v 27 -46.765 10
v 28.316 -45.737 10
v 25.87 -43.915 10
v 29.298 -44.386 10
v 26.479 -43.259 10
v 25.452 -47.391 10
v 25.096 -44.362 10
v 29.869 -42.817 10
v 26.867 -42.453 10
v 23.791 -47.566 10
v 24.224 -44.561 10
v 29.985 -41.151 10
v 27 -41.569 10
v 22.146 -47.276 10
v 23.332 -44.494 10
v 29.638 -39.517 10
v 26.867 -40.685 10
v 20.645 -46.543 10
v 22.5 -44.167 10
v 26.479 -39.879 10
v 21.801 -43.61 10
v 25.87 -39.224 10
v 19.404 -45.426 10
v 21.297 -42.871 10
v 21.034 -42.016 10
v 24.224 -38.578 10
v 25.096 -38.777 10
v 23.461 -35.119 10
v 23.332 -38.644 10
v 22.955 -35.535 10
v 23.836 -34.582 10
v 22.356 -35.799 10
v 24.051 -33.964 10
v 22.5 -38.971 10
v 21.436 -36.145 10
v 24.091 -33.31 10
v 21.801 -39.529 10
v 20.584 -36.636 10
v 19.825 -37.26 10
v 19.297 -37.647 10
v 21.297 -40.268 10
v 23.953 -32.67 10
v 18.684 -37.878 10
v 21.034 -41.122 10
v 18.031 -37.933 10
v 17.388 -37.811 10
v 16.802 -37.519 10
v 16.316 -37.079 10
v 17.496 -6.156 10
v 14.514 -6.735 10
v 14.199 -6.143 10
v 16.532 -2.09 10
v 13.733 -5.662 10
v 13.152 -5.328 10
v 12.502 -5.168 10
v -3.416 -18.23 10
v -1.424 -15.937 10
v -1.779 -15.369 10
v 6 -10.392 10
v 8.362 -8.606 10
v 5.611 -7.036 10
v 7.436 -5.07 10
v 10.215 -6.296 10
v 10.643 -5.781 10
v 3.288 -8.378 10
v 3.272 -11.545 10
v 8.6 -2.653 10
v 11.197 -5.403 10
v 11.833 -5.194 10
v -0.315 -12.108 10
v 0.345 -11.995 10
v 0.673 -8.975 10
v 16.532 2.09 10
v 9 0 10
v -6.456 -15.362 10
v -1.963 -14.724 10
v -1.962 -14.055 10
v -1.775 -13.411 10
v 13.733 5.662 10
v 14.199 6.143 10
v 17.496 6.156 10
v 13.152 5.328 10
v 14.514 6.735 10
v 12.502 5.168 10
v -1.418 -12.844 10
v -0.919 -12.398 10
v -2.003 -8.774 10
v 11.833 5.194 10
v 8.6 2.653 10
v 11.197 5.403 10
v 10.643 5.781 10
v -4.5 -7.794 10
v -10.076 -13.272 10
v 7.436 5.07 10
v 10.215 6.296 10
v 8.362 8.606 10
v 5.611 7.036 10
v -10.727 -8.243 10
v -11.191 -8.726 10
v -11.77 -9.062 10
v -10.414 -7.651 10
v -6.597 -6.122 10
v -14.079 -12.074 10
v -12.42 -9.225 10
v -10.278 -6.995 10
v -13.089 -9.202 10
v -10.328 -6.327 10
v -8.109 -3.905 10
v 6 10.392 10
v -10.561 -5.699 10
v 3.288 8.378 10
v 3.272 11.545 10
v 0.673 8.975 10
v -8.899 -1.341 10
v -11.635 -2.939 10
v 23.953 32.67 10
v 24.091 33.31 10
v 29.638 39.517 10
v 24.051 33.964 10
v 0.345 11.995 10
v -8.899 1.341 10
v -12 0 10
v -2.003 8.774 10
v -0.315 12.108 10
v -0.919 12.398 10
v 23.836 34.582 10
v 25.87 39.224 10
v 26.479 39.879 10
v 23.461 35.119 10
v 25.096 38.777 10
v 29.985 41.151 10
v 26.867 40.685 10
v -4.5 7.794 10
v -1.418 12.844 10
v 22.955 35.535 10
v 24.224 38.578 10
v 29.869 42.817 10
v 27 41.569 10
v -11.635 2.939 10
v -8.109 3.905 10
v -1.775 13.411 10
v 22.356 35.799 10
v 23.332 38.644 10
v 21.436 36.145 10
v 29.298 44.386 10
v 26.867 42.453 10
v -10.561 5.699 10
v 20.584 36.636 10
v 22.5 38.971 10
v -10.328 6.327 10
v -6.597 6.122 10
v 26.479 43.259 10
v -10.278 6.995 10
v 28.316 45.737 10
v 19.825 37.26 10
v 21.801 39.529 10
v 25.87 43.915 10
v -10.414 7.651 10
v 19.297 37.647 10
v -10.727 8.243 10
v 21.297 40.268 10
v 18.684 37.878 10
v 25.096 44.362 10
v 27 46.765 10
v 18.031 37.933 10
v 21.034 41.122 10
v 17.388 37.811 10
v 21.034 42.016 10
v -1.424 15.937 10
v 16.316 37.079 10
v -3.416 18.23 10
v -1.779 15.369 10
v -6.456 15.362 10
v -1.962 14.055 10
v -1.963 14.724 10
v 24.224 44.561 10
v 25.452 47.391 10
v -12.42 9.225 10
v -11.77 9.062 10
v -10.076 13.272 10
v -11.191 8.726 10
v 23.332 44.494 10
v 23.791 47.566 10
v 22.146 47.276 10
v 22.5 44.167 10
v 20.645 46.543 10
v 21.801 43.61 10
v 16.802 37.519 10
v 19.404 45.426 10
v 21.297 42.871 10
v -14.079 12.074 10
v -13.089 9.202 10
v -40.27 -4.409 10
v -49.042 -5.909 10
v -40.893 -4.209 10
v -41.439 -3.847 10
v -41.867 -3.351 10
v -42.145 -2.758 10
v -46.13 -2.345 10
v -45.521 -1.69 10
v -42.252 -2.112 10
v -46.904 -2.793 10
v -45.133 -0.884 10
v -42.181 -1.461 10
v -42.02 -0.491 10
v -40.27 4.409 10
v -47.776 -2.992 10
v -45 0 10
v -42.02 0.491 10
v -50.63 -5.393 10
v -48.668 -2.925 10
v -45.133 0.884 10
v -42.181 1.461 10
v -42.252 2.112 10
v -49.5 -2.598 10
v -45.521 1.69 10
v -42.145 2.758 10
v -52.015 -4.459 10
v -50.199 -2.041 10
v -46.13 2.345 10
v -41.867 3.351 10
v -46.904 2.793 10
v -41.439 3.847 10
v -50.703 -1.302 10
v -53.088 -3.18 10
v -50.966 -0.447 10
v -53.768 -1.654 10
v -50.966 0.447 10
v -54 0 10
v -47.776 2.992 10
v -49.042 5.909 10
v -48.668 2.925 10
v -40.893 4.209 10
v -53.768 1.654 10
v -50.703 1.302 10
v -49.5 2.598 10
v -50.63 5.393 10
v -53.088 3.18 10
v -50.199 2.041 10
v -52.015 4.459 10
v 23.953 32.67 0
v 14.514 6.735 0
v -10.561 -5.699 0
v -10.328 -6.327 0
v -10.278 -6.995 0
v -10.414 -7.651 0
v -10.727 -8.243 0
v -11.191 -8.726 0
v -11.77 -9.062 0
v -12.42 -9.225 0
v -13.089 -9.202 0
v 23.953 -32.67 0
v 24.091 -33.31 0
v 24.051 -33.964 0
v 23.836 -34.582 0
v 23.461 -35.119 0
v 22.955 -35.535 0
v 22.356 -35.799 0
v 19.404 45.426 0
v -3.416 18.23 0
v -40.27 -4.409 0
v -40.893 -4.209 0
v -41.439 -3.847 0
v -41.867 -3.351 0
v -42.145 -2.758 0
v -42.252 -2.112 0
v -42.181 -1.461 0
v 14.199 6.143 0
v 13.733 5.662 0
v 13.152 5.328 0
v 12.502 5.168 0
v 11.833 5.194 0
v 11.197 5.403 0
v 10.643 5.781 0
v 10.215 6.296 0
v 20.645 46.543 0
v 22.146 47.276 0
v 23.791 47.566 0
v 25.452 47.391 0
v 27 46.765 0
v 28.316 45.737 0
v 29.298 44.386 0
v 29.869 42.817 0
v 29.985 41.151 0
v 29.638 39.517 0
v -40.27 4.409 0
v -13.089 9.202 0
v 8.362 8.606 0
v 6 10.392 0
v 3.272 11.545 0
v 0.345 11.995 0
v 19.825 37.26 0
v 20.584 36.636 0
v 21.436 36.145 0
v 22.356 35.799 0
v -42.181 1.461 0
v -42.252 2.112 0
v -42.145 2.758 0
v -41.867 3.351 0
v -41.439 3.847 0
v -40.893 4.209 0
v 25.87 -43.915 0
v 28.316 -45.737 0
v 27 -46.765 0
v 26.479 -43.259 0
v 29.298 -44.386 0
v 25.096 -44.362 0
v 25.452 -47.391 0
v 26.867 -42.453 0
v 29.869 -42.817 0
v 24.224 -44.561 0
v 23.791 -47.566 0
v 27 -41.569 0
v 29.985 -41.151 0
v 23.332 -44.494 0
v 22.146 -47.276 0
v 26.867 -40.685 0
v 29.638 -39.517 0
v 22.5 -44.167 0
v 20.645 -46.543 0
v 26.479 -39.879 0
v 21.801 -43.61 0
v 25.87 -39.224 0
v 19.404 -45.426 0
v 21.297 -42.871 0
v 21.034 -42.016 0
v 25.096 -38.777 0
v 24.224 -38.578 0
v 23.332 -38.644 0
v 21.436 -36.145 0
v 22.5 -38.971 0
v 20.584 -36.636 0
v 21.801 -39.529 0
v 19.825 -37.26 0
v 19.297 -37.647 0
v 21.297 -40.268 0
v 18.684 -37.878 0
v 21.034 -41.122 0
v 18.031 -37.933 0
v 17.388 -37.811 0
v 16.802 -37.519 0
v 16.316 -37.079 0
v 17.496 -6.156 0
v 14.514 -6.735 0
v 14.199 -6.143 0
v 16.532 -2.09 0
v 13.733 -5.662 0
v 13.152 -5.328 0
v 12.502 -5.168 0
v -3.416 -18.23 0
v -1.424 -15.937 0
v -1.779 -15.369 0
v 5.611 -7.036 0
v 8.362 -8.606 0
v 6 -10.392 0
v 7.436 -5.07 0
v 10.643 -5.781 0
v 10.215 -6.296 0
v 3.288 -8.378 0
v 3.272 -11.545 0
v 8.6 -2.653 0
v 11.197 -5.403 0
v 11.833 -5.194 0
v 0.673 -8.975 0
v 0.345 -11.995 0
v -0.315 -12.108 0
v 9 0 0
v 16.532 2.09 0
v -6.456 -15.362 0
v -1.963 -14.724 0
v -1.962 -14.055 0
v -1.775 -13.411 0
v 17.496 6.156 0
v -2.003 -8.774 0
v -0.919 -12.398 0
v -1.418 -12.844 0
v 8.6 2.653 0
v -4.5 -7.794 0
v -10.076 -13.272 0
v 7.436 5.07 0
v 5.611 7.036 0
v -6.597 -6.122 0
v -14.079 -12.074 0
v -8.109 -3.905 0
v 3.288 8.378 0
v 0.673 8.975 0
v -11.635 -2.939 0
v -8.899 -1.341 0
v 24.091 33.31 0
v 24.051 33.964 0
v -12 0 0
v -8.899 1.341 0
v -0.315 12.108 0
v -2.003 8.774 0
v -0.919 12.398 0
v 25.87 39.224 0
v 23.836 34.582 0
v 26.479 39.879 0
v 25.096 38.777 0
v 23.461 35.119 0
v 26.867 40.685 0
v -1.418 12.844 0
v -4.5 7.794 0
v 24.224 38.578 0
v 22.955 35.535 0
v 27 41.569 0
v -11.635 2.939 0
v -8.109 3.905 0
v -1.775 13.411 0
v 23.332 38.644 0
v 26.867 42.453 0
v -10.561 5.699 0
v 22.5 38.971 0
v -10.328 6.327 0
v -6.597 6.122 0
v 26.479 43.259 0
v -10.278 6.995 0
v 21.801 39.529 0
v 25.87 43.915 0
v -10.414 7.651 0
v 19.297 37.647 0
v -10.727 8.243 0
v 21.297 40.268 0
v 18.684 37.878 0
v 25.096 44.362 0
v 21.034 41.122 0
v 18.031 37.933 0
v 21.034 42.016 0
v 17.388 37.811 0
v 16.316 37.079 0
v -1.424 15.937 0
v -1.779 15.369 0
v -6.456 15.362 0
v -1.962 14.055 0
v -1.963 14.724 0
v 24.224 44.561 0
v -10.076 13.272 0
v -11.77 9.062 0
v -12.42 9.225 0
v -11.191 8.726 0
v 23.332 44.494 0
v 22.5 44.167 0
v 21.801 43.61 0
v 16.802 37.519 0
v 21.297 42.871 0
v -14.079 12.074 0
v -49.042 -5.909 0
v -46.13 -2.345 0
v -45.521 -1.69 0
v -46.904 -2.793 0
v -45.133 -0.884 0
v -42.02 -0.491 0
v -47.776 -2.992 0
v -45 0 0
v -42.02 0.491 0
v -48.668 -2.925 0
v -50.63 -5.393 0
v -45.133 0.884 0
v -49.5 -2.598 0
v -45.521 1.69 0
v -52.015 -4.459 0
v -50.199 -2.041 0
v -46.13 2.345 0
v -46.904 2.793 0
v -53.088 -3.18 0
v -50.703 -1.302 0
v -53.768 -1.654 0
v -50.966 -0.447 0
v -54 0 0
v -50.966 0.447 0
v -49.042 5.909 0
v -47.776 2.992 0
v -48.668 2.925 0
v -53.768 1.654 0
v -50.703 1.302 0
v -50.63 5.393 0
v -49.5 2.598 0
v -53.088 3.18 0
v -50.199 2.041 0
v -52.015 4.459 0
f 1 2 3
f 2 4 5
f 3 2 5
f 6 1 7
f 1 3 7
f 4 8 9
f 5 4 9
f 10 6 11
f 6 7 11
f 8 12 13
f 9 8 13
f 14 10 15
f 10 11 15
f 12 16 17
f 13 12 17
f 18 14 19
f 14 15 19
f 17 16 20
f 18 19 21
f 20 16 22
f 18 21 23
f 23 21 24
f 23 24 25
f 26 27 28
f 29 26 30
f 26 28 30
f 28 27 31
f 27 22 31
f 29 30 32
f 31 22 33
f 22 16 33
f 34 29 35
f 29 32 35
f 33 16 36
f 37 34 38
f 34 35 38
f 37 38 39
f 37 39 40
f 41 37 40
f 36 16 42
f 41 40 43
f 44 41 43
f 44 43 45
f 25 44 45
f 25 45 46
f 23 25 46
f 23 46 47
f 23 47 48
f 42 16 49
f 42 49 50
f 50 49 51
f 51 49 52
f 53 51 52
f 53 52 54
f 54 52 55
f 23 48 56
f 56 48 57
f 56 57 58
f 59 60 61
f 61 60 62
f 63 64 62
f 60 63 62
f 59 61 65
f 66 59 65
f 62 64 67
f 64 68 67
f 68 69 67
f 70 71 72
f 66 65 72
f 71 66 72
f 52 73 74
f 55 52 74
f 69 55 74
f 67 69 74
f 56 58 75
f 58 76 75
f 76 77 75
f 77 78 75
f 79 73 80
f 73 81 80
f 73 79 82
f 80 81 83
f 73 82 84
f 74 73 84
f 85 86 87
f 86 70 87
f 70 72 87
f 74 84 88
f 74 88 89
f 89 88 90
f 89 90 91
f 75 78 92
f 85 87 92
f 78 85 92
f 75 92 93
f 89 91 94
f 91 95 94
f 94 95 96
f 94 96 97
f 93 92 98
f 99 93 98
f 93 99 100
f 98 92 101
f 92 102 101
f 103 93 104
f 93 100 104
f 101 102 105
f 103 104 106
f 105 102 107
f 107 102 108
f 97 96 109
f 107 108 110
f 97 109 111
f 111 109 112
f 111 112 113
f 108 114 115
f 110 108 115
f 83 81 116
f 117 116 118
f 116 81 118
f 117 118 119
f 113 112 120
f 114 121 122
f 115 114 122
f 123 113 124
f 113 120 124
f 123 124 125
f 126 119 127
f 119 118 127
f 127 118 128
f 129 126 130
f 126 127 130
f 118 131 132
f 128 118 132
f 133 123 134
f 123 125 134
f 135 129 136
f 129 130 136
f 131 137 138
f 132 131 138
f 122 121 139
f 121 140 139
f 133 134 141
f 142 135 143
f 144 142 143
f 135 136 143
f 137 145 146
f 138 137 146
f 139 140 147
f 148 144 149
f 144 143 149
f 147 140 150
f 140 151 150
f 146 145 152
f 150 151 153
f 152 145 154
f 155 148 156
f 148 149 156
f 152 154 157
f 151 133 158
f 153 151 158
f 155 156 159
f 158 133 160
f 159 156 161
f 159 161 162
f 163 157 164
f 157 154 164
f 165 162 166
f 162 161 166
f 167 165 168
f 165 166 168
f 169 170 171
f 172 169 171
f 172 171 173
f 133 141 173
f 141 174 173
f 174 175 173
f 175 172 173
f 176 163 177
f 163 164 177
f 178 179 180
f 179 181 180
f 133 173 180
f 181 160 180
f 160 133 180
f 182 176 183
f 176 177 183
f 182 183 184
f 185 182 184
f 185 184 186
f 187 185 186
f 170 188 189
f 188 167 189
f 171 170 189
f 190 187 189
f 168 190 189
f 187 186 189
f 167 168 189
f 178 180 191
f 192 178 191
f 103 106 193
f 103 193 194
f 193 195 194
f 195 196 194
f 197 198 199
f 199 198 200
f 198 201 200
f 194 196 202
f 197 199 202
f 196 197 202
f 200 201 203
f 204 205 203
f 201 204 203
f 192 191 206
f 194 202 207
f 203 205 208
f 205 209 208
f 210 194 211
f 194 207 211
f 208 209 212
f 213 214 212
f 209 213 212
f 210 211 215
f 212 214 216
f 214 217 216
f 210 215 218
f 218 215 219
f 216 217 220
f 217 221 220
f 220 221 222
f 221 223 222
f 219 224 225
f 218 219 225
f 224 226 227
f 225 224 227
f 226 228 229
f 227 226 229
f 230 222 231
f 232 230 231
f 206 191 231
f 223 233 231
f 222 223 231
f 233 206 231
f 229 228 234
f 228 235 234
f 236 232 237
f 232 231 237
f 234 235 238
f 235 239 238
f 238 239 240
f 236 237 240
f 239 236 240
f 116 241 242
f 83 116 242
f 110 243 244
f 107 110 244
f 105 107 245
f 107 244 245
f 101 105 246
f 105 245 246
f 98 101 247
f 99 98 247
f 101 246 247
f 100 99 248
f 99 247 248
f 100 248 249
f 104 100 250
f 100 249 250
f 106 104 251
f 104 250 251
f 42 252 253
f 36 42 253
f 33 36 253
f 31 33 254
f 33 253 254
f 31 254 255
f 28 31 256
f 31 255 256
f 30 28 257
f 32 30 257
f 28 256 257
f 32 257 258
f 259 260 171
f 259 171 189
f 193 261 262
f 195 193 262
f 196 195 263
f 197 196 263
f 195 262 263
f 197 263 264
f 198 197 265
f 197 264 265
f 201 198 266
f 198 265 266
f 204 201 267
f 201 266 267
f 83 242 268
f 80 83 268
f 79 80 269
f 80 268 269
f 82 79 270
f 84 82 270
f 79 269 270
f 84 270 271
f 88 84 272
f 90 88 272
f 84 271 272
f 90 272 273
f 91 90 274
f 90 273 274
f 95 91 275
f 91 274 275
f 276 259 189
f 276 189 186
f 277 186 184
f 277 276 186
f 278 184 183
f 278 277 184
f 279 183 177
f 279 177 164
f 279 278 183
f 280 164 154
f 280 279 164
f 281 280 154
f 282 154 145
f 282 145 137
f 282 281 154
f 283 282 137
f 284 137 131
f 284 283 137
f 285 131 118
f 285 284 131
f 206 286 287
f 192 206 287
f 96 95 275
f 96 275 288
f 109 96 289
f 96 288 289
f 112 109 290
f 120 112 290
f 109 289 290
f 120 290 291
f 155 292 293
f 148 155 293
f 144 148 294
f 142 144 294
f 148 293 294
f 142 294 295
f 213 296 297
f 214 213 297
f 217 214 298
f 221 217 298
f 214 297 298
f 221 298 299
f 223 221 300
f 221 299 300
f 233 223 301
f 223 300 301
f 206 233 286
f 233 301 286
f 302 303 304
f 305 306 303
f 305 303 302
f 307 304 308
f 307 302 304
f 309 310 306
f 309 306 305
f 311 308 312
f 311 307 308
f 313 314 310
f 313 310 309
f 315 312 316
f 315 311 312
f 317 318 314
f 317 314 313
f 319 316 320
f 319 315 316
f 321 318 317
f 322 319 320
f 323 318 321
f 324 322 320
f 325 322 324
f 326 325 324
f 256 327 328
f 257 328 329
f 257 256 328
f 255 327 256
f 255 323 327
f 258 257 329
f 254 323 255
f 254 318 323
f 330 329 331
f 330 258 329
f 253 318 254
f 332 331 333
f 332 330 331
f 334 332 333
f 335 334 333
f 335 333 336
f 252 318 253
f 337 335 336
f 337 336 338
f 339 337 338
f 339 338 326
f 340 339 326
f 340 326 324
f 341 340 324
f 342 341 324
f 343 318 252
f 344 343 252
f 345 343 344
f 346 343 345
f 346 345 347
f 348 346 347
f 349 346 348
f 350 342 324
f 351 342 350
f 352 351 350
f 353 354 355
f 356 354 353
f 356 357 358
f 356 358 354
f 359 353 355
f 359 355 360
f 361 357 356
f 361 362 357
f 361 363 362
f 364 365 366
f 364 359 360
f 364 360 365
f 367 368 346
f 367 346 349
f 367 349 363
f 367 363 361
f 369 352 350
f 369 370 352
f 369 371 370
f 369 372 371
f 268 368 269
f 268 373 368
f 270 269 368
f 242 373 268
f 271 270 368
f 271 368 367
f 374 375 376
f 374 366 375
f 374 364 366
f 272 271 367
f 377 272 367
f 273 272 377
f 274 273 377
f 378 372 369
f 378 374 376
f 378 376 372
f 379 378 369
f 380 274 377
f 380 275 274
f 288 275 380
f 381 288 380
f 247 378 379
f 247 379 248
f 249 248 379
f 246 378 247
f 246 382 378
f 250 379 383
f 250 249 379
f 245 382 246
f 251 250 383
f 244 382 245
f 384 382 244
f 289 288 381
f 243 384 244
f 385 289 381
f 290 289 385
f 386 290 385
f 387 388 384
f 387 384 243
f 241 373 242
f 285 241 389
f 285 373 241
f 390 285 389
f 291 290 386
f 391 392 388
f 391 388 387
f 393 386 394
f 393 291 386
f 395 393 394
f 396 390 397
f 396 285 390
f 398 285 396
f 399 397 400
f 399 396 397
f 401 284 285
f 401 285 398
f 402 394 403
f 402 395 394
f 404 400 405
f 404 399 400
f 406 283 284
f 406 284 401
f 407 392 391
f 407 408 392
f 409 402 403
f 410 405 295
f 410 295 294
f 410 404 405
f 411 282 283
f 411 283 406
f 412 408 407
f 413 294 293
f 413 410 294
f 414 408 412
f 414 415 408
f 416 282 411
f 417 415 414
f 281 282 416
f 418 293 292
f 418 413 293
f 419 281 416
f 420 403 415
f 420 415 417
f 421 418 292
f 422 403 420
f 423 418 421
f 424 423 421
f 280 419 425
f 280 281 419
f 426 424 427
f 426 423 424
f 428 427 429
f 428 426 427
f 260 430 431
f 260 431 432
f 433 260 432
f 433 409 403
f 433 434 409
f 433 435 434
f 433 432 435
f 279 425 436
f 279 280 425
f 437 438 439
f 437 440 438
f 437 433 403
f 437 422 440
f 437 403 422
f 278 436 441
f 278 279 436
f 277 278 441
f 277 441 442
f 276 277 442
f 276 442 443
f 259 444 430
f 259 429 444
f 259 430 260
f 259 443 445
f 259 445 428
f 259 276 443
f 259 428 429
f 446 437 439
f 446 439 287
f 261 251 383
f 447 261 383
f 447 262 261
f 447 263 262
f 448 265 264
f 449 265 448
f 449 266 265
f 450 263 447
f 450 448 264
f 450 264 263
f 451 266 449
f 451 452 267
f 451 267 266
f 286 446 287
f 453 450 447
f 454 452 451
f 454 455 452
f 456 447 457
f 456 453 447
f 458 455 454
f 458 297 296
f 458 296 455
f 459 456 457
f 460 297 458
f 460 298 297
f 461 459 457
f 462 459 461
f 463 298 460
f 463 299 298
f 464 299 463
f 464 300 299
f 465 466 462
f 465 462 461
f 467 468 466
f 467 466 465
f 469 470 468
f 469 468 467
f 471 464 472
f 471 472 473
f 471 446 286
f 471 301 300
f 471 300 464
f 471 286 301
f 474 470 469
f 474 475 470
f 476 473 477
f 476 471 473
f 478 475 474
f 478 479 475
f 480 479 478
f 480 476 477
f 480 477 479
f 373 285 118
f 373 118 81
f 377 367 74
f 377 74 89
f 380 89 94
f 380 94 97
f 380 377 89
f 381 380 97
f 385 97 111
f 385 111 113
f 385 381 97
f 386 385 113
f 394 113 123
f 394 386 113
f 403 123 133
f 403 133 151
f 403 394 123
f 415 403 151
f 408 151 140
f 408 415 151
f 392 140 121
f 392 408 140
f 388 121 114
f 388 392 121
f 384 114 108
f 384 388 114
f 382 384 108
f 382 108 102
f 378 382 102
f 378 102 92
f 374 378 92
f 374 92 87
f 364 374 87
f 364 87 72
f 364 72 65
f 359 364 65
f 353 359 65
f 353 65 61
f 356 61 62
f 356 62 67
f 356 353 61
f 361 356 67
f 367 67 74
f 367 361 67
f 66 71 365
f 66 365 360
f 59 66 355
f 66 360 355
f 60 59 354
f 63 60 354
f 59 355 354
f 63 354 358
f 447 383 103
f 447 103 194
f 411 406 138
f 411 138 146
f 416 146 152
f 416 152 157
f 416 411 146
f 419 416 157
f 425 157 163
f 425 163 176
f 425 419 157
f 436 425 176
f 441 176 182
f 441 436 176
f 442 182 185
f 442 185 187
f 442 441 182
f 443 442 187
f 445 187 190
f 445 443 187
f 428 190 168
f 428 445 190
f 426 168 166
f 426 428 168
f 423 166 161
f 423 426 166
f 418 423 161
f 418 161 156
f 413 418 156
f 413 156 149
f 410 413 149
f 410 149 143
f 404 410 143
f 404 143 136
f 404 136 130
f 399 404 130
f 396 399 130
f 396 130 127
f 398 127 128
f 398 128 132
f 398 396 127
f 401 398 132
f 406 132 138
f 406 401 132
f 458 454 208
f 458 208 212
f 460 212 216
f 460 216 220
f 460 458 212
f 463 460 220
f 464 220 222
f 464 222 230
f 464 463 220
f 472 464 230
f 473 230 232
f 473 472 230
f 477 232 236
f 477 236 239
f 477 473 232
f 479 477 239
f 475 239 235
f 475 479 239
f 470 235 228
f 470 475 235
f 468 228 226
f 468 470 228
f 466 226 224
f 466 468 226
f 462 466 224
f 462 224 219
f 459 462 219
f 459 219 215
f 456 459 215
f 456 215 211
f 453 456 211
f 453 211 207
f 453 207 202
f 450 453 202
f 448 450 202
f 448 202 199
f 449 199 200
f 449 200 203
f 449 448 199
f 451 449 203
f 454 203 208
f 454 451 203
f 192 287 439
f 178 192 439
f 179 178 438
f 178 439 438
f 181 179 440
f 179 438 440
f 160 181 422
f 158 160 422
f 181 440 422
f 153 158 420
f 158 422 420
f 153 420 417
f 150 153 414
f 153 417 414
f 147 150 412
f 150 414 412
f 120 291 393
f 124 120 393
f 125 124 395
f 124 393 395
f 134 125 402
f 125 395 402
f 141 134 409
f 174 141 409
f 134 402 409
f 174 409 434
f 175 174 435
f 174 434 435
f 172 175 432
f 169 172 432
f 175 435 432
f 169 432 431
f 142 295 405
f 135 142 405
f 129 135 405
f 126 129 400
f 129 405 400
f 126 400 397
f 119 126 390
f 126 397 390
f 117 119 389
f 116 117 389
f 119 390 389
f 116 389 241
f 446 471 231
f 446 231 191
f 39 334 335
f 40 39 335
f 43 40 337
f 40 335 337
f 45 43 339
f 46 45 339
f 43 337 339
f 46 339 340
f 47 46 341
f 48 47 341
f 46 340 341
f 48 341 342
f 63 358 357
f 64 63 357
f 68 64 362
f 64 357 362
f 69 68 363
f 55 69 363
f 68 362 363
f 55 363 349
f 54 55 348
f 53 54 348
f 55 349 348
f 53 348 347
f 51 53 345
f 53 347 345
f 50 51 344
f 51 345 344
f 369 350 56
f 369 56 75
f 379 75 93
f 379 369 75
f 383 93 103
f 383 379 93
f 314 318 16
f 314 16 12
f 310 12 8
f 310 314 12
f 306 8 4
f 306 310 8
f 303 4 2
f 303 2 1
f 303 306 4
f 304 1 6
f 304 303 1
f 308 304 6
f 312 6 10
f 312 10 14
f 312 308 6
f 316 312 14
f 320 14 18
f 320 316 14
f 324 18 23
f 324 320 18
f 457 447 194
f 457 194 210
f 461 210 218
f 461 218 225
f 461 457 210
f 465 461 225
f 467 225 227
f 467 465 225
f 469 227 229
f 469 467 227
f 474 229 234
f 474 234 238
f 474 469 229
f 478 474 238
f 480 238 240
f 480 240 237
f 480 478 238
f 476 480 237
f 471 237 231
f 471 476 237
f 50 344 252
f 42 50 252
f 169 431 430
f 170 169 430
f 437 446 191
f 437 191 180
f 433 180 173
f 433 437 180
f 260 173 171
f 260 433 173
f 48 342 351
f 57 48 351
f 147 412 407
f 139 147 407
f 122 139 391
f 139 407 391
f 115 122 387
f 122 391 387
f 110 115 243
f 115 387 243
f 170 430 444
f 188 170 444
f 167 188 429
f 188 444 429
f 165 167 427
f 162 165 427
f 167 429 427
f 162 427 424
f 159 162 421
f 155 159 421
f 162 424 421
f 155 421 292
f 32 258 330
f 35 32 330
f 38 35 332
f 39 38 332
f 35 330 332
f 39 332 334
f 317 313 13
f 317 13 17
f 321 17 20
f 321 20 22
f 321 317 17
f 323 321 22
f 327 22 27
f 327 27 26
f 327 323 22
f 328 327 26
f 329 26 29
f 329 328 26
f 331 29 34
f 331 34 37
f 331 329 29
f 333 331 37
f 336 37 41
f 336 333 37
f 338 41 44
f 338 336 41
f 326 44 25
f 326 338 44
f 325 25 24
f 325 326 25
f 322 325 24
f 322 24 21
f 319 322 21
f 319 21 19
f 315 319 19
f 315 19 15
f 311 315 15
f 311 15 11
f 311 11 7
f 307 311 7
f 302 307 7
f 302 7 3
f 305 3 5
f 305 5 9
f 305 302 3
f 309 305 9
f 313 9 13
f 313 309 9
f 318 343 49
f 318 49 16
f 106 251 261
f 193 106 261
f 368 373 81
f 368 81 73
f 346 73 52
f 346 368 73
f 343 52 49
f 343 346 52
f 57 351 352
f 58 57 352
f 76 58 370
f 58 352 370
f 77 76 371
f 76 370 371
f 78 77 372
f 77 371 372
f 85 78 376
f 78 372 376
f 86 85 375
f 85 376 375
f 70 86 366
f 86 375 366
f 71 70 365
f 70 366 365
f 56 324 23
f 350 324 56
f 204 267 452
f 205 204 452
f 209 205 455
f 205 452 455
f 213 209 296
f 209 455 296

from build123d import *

# Parameters (mm, degrees)
SKETCH1_R           = 9
SKETCH1_R_2         = 3
BOSS_EXTRUDE2_DEPTH = 10


with BuildPart() as part:
    # Sketch1 → Boss-Extrude2 (new body)
    with BuildSketch(Plane.XY):
        with BuildLine():
            Line((-49.041889066, 5.908846518), (-14.079486813, 12.073661346))
            ThreePointArc((-14.079486813, 12.073661346), (-8.205154011, 14.211743632), (-3.416354035, 18.230023925))
            Line((-3.416354035, 18.230023925), (19.403733341, 45.42594504))
            ThreePointArc((19.403733341, 45.42594504), (27, 46.765371804), (29.638155725, 39.517098522))
            Line((29.638155725, 39.517098522), (17.495840849, 6.15636258))
            ThreePointArc((17.495840849, 6.15636258), (16.410308023, 0), (17.495840849, -6.15636258))
            Line((17.495840849, -6.15636258), (29.638155725, -39.517098522))
            ThreePointArc((29.638155725, -39.517098522), (27, -46.765371804), (19.403733341, -45.42594504))
            Line((19.403733341, -45.42594504), (-3.416354035, -18.230023925))
            ThreePointArc((-3.416354035, -18.230023925), (-8.205154011, -14.211743632), (-14.079486813, -12.073661346))
            Line((-14.079486813, -12.073661346), (-49.041889066, -5.908846518))
            ThreePointArc((-49.041889066, -5.908846518), (-54, 0), (-49.041889066, 5.908846518))
        make_face()
        Circle(SKETCH1_R, mode=Mode.SUBTRACT)
        with Locations((-48, 0)):
            Circle(SKETCH1_R_2, mode=Mode.SUBTRACT)
        with Locations((24, 41.569219382)):
            Circle(SKETCH1_R_2, mode=Mode.SUBTRACT)
        with Locations((24, -41.569219382)):
            Circle(SKETCH1_R_2, mode=Mode.SUBTRACT)
        with BuildLine():
            Line((-40.269689417, 4.409342161), (-13.089403061, 9.201959989))
            ThreePointArc((-13.089403061, 9.201959989), (-10.726679899, 8.24313144), (-10.560539529, 5.698684484))
            ThreePointArc((-10.560539529, 5.698684484), (-12, 0), (-10.560539529, -5.698684484))
            ThreePointArc((-10.560539529, -5.698684484), (-10.726679899, -8.24313144), (-13.089403061, -9.201959989))
            Line((-13.089403061, -9.201959989), (-40.269689417, -4.409342161))
            ThreePointArc((-40.269689417, -4.409342161), (-41.866838007, -3.351249763), (-42.180666993, -1.461288252))
            ThreePointArc((-42.180666993, -1.461288252), (-42, 0), (-42.180666993, 1.461288252))
            ThreePointArc((-42.180666993, 1.461288252), (-41.866838007, 3.351249763), (-40.269689417, 4.409342161))
        make_face(mode=Mode.SUBTRACT)
        with BuildLine():
            Line((23.953447034, 32.669902957), (14.513832645, 6.734775577))
            ThreePointArc((14.513832645, 6.734775577), (12.502101183, 5.168011571), (10.215475296, 6.296353268))
            ThreePointArc((10.215475296, 6.296353268), (6, 10.392304845), (0.345064233, 11.995037752))
            ThreePointArc((0.345064233, 11.995037752), (-1.775421284, 13.41114301), (-1.424429584, 15.936735566))
            Line((-1.424429584, 15.936735566), (16.316242383, 37.079245118))
            ThreePointArc((16.316242383, 37.079245118), (18.031151575, 37.933370172), (19.824820748, 37.260173291))
            ThreePointArc((19.824820748, 37.260173291), (21, 36.373066959), (22.355846246, 35.798885039))
            ThreePointArc((22.355846246, 35.798885039), (23.835686433, 34.582120409), (23.953447034, 32.669902957))
        make_face(mode=Mode.SUBTRACT)
        with BuildLine():
            Line((16.316242383, -37.079245118), (-1.424429584, -15.936735566))
            ThreePointArc((-1.424429584, -15.936735566), (-1.775421284, -13.41114301), (0.345064233, -11.995037752))
            ThreePointArc((0.345064233, -11.995037752), (6, -10.392304845), (10.215475296, -6.296353268))
            ThreePointArc((10.215475296, -6.296353268), (12.502101183, -5.168011571), (14.513832645, -6.734775577))
            Line((14.513832645, -6.734775577), (23.953447034, -32.669902957))
            ThreePointArc((23.953447034, -32.669902957), (23.835686433, -34.582120409), (22.355846246, -35.798885039))
            ThreePointArc((22.355846246, -35.798885039), (21, -36.373066959), (19.824820748, -37.260173291))
            ThreePointArc((19.824820748, -37.260173291), (18.031151575, -37.933370172), (16.316242383, -37.079245118))
        make_face(mode=Mode.SUBTRACT)
    extrude(amount=BOSS_EXTRUDE2_DEPTH)


solid = part.part
